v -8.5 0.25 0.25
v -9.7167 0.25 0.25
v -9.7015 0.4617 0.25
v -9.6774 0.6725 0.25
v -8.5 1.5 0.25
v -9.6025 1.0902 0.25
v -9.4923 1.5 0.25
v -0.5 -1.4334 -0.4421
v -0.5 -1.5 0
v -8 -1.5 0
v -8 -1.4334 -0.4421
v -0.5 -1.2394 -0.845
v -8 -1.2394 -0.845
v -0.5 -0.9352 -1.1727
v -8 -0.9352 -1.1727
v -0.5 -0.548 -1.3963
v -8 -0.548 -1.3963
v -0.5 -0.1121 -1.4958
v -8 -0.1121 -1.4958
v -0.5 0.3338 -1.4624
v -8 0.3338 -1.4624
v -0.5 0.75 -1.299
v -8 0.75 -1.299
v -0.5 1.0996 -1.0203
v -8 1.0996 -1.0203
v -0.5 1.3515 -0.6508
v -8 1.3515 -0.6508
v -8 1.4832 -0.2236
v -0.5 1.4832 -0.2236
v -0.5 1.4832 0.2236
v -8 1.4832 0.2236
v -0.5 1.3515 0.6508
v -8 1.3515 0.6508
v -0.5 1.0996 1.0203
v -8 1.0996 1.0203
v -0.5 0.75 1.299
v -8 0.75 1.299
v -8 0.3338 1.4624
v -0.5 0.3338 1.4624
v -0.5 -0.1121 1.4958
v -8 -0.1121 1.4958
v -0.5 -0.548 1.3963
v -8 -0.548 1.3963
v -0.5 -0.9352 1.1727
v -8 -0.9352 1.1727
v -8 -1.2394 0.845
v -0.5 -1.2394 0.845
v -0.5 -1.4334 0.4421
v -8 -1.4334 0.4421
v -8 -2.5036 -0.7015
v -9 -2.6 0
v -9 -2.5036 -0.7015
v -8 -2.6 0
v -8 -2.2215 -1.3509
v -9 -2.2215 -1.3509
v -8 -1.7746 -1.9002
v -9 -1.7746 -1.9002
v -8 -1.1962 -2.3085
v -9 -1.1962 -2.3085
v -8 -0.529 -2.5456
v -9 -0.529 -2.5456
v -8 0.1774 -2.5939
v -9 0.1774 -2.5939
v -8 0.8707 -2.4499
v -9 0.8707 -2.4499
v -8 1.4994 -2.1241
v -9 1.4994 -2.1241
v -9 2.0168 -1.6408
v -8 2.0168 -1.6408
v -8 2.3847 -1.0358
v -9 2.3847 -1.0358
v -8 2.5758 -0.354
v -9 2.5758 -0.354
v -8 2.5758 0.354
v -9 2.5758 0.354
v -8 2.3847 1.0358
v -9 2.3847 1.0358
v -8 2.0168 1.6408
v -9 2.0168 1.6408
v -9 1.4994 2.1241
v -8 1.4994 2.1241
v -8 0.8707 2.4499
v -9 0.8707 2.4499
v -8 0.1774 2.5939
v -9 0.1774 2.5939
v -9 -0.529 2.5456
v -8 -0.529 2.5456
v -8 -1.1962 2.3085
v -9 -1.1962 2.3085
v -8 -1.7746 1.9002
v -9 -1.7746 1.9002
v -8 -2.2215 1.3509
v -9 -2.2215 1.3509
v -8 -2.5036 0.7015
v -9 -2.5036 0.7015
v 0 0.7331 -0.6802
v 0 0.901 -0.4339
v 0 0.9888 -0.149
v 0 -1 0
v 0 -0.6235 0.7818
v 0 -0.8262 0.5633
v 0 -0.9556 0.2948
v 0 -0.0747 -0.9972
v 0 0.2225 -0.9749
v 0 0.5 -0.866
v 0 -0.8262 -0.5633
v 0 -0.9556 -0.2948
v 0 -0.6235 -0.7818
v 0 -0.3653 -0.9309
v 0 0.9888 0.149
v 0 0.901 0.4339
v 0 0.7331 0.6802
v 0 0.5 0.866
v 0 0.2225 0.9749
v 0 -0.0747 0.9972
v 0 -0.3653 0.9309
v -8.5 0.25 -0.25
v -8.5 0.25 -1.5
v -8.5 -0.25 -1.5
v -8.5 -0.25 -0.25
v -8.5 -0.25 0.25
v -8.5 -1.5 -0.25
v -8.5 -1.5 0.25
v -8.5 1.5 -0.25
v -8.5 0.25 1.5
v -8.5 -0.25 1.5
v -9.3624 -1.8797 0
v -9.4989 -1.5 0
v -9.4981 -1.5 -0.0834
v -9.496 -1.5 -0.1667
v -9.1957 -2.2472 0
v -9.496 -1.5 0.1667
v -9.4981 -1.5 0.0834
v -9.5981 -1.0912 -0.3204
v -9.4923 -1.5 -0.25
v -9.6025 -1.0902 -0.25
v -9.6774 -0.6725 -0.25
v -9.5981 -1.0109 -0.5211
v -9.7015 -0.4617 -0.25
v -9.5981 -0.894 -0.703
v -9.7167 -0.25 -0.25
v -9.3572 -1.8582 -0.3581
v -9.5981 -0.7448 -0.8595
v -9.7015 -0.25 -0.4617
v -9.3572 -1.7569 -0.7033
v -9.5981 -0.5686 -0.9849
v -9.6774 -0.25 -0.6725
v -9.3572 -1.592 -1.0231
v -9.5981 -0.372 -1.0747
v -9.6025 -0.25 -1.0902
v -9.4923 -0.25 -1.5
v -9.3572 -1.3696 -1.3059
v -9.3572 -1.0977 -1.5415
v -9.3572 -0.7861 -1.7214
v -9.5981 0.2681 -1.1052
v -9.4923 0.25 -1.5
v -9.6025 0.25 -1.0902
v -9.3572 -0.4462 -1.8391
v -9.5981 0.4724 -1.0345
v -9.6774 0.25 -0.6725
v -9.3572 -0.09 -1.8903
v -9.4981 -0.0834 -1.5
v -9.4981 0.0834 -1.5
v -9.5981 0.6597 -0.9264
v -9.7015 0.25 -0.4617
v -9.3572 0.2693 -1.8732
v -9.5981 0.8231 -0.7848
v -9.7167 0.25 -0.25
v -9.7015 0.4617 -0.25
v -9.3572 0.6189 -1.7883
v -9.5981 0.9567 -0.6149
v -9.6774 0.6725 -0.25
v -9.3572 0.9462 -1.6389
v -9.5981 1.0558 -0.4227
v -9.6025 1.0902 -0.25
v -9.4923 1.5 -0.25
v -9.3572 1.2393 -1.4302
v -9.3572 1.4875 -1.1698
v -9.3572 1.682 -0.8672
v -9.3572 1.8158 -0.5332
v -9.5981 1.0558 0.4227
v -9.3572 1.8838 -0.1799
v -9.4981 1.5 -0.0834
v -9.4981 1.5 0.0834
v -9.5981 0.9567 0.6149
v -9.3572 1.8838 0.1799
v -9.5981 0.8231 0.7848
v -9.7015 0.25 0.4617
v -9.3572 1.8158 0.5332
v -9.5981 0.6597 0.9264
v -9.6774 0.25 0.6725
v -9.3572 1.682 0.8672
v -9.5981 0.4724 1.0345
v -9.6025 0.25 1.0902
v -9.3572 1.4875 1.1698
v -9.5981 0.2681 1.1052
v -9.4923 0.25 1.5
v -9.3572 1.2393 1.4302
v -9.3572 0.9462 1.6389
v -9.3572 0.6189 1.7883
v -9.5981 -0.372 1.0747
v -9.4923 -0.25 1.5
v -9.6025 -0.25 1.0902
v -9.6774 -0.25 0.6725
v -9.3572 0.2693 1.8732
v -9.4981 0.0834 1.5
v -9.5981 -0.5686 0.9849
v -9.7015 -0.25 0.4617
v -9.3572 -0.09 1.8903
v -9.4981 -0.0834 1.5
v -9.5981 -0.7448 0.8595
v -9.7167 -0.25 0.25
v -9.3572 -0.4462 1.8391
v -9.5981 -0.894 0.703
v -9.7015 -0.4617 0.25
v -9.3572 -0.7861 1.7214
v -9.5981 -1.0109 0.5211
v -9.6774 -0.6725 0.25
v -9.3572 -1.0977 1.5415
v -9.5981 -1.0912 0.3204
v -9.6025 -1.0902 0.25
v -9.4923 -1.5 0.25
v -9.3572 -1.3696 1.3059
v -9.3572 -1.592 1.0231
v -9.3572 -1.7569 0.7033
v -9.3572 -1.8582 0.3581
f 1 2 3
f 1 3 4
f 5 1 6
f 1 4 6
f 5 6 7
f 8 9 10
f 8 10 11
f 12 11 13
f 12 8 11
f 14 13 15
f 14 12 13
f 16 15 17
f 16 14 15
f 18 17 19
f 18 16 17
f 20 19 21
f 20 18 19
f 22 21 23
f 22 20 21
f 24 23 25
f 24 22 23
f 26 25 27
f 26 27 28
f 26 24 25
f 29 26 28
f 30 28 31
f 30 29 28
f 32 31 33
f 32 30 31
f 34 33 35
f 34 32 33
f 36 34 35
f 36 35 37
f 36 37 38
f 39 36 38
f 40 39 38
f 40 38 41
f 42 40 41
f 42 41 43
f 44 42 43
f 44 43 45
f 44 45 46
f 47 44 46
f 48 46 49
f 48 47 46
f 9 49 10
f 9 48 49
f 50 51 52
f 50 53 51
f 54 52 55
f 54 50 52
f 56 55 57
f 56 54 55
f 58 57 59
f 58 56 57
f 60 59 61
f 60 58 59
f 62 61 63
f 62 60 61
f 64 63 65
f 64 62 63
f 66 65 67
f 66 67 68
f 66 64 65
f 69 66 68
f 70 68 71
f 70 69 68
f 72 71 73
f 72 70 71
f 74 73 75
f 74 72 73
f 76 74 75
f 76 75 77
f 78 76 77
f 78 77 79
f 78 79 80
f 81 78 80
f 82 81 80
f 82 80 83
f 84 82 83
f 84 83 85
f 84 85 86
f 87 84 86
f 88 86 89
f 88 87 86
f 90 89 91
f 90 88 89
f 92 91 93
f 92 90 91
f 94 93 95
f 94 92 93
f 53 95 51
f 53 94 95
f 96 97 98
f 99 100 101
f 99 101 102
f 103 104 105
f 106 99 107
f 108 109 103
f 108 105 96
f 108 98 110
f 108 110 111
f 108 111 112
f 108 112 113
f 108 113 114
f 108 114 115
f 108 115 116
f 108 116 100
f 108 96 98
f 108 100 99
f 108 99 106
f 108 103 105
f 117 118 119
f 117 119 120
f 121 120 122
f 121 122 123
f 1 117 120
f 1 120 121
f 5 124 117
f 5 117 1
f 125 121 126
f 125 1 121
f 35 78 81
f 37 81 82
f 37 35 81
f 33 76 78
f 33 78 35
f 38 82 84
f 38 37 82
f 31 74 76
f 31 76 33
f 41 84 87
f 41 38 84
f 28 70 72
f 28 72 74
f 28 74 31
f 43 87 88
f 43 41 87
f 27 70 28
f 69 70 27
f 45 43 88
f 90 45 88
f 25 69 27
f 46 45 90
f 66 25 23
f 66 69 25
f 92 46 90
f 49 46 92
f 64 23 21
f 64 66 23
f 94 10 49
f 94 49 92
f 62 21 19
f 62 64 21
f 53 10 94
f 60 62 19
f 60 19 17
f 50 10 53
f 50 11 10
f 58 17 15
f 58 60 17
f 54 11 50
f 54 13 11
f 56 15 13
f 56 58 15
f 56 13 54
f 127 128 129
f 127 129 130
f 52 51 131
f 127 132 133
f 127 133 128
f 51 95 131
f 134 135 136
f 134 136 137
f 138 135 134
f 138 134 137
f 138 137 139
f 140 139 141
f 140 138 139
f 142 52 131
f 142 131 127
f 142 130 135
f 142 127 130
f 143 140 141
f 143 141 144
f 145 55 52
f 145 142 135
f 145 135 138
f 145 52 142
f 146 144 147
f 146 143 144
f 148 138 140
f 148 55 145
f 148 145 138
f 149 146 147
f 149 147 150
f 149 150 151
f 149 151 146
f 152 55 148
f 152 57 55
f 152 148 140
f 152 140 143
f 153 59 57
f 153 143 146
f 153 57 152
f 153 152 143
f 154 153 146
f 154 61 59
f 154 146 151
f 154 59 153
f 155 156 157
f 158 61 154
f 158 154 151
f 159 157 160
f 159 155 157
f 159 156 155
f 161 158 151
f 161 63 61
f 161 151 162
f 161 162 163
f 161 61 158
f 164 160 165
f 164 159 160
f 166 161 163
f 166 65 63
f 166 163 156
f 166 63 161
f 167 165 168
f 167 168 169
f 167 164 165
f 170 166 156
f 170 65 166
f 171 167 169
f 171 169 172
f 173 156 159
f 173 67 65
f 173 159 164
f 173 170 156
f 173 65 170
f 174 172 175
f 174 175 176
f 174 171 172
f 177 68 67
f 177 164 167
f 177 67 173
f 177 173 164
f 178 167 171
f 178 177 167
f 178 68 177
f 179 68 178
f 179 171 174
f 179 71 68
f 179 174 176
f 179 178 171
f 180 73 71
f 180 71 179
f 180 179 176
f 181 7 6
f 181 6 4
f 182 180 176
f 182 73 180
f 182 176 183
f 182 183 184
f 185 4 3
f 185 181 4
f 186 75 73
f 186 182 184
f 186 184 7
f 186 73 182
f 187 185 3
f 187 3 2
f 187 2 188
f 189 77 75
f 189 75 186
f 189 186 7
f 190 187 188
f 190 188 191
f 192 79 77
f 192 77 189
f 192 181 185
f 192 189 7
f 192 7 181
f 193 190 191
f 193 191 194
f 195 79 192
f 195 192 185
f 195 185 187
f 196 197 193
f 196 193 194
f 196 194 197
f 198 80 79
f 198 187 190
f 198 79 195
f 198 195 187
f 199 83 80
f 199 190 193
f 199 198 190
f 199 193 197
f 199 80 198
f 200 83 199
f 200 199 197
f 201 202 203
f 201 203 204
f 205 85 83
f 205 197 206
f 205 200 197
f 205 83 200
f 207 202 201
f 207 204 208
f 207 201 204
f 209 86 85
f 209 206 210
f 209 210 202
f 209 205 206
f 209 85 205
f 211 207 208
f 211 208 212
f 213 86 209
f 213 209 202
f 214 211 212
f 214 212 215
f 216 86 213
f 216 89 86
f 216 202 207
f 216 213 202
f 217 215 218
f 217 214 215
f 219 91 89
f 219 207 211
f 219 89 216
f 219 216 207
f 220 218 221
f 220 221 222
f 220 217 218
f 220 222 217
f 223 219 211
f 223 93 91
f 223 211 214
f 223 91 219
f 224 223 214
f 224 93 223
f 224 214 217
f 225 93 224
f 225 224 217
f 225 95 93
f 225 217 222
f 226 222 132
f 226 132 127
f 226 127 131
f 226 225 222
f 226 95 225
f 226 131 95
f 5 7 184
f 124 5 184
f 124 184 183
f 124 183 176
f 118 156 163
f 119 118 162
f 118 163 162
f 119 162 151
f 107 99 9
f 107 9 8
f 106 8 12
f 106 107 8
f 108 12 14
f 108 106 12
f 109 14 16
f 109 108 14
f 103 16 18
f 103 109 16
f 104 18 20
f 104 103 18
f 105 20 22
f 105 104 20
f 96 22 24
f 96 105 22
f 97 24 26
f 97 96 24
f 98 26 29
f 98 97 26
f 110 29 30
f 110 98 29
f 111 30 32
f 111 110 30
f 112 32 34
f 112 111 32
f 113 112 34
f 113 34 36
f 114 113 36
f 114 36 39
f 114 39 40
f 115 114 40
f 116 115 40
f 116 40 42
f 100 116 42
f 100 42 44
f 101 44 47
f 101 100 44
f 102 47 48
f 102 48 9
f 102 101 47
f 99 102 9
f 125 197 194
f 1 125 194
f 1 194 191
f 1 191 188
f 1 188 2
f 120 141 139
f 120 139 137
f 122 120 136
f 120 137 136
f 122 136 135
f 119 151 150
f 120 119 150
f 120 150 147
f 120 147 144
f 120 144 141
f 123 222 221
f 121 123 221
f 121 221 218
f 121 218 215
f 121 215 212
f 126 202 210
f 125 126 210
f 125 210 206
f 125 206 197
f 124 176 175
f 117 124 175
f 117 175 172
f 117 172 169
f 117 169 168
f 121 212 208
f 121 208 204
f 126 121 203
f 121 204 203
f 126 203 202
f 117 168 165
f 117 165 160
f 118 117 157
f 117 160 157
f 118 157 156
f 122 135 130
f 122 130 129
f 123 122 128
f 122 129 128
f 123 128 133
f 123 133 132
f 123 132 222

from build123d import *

# Parameters (mm, degrees)
CUT_EXTRUDE_1_DEPTH = 4.5
CHAMFER_1_SIZE      = 0.5


with BuildPart() as part:
    # Эскиз1 → Повернуть1 (revolve)
    with BuildSketch(Plane.XY, mode=Mode.PRIVATE) as revolve_1_sk:
        with BuildLine():
            Line((-8, 1.5), (0, 1.5))
            Line((0, 1.5), (0, 0))
            Line((0, 0), (-9.729168699, 0))
            ThreePointArc((-9.729168699, 0), (-9.543426508, 1.350156194), (-9, 2.6))
            Line((-9, 2.6), (-8, 2.6))
            Line((-8, 2.6), (-8, 1.5))
        make_face()
    revolve(revolve_1_sk.sketch.rotate(Axis((-9.729168699, 0, 0), (1, 0, 0)), 180), axis=Axis((-9.729168699, 0, 0), (1, 0, 0)))

    # Эскиз3 → Вырез-Вытянуть1 (cut)
    with BuildSketch(Plane(origin=(-13, 0, 0), x_dir=(0, 0, -1), z_dir=(1, 0, 0))):
        Polygon((-0.25, 0.25), (-0.25, 1.5), (0.25, 1.5), (0.25, 0.25), (1.5, 0.25), (1.5, -0.25), (0.25, -0.25), (0.25, -1.5), (-0.25, -1.5), (-0.25, -0.25), (-1.5, -0.25), (-1.5, 0.25), align=None)
    extrude(amount=CUT_EXTRUDE_1_DEPTH, mode=Mode.SUBTRACT)

    # Фаска1
    chamfer_1_edges = [part.edges().sort_by_distance(p)[0] for p in [
        (0, 1.5, 0),
    ]]
    chamfer(chamfer_1_edges, length=CHAMFER_1_SIZE)


solid = part.part
